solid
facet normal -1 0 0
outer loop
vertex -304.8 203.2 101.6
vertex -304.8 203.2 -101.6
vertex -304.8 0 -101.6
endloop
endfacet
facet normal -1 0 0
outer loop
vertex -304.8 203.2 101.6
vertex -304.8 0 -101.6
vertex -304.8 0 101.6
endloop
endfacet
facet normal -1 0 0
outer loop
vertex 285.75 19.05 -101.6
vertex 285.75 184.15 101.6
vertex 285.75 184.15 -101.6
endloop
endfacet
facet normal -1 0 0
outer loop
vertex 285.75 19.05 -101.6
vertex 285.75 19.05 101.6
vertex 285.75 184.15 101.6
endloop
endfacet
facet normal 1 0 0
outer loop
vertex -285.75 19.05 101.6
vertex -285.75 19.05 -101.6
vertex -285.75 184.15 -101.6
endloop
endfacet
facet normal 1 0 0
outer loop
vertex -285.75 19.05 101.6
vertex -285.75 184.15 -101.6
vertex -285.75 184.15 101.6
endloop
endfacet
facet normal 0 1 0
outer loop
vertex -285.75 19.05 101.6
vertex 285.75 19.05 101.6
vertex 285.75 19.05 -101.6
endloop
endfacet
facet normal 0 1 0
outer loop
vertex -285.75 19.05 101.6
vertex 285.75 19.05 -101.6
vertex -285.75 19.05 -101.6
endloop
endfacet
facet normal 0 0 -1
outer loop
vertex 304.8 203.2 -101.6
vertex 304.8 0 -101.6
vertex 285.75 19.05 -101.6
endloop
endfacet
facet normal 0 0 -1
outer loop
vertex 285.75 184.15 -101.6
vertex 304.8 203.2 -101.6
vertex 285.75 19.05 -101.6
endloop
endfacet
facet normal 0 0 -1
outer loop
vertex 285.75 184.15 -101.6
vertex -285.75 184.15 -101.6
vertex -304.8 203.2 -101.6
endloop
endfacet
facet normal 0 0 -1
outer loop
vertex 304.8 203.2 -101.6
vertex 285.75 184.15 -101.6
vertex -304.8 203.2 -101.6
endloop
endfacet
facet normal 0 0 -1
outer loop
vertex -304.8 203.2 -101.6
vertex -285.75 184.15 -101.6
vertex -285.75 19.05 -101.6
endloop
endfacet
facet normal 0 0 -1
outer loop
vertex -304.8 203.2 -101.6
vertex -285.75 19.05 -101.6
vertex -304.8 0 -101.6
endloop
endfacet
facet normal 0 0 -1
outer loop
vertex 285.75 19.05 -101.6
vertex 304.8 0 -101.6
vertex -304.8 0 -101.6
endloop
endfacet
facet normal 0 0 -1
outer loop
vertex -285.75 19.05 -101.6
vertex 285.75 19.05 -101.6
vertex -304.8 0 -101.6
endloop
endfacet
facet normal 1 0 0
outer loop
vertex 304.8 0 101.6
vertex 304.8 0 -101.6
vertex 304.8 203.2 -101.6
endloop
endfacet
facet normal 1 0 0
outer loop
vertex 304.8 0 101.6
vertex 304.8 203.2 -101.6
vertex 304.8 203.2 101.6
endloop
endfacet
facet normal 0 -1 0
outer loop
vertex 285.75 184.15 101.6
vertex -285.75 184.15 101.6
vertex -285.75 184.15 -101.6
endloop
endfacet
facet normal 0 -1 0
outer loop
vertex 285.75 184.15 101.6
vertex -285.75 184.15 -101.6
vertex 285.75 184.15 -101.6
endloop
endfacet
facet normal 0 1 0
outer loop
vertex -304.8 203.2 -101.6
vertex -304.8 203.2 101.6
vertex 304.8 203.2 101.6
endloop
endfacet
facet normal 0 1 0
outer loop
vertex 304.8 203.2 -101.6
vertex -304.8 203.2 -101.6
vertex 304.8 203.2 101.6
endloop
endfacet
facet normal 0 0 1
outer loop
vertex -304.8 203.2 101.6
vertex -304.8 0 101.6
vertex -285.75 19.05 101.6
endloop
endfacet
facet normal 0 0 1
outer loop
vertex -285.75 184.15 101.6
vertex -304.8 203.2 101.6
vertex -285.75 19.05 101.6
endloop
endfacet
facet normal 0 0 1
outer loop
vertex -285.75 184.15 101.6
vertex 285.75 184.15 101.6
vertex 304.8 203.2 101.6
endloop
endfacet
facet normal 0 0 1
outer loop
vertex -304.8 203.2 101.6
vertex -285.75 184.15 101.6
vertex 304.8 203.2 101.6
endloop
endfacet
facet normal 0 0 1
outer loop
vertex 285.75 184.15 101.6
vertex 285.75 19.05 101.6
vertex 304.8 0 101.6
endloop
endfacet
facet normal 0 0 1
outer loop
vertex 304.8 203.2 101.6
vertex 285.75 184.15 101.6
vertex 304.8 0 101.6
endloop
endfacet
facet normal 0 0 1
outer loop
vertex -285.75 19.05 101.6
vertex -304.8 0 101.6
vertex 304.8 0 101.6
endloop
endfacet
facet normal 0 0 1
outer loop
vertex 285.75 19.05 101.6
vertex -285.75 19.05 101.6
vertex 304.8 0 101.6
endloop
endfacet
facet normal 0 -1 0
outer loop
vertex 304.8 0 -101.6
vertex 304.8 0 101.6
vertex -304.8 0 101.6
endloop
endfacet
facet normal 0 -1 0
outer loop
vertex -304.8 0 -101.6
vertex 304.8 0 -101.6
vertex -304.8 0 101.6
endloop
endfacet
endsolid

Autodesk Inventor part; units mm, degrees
ref_plane "YZ Plane" through (0, 0, 0) normal (1, 0, 0) x (0, 1, 0)
ref_plane "XZ Plane" through (0, 0, 0) normal (0, 1, 0) x (-1, 0, 0)
ref_plane "XY Plane" through (0, 0, 0) normal (0, 0, 1) x (1, 0, 0)
sketch "Sketch1" plane through (0, 0, 0) normal (0, 1, 0) x (-1, 0, 0)
  line L0 (-304.8, 101.6) -> (304.8, 101.6)
  line L1 (304.8, 101.6) -> (304.8, -101.6)
  line L2 (304.8, -101.6) -> (-304.8, -101.6)
  line L3 (-304.8, -101.6) -> (-304.8, 101.6)
  line L4 (-304.8, 101.6) -> (304.8, -101.6) construction
  line L5 (304.8, 101.6) -> (-304.8, -101.6) construction
  point P0 (0, 0)
  dimension "length" = 609.6
  dimension "width" = 203.2
extrude "Extrusion1" add sketch "Sketch1" along normal blind 19.05
sketch "Sketch2" plane through (0, 19.05, 0) normal (0, 1, 0) x (1, 0, 0)
  line L0 (-304.8, -101.6) -> (304.8, -101.6) projected
  line L1 (304.8, 101.6) -> (-304.8, 101.6) projected
  line L2 (-304.8, -101.6) -> (-304.8, 101.6)
  line L3 (-304.8, 101.6) -> (-285.75, 101.6)
  line L4 (-285.75, 101.6) -> (-285.75, -101.6)
  line L5 (-285.75, -101.6) -> (-304.8, -101.6)
  point P0 (0, 0)
  dimension "d4" = 19.05
extrude "Extrusion2" add sketch "Sketch2" along normal blind 165.1
ref_plane "Work Plane1" through (0, 0, 101.6) normal (1, 0, 0) x (0, 0, -1)
ref_plane "Work Plane2" through (0, 101.6, 0) normal (0, 1, 0) x (1, 0, 0)
mirror "Mirror1" about plane through (0, 101.6, 0) normal (0, 1, 0) of "Extrusion1"
mirror "Mirror2" about plane through (0, 0, 101.6) normal (1, 0, 0) of "Extrusion2"
equation "\"d4\" = thickness"
equation "\"thickness\" = 19.05"
properties part number "cabinet" material "Pine, Radiata"
